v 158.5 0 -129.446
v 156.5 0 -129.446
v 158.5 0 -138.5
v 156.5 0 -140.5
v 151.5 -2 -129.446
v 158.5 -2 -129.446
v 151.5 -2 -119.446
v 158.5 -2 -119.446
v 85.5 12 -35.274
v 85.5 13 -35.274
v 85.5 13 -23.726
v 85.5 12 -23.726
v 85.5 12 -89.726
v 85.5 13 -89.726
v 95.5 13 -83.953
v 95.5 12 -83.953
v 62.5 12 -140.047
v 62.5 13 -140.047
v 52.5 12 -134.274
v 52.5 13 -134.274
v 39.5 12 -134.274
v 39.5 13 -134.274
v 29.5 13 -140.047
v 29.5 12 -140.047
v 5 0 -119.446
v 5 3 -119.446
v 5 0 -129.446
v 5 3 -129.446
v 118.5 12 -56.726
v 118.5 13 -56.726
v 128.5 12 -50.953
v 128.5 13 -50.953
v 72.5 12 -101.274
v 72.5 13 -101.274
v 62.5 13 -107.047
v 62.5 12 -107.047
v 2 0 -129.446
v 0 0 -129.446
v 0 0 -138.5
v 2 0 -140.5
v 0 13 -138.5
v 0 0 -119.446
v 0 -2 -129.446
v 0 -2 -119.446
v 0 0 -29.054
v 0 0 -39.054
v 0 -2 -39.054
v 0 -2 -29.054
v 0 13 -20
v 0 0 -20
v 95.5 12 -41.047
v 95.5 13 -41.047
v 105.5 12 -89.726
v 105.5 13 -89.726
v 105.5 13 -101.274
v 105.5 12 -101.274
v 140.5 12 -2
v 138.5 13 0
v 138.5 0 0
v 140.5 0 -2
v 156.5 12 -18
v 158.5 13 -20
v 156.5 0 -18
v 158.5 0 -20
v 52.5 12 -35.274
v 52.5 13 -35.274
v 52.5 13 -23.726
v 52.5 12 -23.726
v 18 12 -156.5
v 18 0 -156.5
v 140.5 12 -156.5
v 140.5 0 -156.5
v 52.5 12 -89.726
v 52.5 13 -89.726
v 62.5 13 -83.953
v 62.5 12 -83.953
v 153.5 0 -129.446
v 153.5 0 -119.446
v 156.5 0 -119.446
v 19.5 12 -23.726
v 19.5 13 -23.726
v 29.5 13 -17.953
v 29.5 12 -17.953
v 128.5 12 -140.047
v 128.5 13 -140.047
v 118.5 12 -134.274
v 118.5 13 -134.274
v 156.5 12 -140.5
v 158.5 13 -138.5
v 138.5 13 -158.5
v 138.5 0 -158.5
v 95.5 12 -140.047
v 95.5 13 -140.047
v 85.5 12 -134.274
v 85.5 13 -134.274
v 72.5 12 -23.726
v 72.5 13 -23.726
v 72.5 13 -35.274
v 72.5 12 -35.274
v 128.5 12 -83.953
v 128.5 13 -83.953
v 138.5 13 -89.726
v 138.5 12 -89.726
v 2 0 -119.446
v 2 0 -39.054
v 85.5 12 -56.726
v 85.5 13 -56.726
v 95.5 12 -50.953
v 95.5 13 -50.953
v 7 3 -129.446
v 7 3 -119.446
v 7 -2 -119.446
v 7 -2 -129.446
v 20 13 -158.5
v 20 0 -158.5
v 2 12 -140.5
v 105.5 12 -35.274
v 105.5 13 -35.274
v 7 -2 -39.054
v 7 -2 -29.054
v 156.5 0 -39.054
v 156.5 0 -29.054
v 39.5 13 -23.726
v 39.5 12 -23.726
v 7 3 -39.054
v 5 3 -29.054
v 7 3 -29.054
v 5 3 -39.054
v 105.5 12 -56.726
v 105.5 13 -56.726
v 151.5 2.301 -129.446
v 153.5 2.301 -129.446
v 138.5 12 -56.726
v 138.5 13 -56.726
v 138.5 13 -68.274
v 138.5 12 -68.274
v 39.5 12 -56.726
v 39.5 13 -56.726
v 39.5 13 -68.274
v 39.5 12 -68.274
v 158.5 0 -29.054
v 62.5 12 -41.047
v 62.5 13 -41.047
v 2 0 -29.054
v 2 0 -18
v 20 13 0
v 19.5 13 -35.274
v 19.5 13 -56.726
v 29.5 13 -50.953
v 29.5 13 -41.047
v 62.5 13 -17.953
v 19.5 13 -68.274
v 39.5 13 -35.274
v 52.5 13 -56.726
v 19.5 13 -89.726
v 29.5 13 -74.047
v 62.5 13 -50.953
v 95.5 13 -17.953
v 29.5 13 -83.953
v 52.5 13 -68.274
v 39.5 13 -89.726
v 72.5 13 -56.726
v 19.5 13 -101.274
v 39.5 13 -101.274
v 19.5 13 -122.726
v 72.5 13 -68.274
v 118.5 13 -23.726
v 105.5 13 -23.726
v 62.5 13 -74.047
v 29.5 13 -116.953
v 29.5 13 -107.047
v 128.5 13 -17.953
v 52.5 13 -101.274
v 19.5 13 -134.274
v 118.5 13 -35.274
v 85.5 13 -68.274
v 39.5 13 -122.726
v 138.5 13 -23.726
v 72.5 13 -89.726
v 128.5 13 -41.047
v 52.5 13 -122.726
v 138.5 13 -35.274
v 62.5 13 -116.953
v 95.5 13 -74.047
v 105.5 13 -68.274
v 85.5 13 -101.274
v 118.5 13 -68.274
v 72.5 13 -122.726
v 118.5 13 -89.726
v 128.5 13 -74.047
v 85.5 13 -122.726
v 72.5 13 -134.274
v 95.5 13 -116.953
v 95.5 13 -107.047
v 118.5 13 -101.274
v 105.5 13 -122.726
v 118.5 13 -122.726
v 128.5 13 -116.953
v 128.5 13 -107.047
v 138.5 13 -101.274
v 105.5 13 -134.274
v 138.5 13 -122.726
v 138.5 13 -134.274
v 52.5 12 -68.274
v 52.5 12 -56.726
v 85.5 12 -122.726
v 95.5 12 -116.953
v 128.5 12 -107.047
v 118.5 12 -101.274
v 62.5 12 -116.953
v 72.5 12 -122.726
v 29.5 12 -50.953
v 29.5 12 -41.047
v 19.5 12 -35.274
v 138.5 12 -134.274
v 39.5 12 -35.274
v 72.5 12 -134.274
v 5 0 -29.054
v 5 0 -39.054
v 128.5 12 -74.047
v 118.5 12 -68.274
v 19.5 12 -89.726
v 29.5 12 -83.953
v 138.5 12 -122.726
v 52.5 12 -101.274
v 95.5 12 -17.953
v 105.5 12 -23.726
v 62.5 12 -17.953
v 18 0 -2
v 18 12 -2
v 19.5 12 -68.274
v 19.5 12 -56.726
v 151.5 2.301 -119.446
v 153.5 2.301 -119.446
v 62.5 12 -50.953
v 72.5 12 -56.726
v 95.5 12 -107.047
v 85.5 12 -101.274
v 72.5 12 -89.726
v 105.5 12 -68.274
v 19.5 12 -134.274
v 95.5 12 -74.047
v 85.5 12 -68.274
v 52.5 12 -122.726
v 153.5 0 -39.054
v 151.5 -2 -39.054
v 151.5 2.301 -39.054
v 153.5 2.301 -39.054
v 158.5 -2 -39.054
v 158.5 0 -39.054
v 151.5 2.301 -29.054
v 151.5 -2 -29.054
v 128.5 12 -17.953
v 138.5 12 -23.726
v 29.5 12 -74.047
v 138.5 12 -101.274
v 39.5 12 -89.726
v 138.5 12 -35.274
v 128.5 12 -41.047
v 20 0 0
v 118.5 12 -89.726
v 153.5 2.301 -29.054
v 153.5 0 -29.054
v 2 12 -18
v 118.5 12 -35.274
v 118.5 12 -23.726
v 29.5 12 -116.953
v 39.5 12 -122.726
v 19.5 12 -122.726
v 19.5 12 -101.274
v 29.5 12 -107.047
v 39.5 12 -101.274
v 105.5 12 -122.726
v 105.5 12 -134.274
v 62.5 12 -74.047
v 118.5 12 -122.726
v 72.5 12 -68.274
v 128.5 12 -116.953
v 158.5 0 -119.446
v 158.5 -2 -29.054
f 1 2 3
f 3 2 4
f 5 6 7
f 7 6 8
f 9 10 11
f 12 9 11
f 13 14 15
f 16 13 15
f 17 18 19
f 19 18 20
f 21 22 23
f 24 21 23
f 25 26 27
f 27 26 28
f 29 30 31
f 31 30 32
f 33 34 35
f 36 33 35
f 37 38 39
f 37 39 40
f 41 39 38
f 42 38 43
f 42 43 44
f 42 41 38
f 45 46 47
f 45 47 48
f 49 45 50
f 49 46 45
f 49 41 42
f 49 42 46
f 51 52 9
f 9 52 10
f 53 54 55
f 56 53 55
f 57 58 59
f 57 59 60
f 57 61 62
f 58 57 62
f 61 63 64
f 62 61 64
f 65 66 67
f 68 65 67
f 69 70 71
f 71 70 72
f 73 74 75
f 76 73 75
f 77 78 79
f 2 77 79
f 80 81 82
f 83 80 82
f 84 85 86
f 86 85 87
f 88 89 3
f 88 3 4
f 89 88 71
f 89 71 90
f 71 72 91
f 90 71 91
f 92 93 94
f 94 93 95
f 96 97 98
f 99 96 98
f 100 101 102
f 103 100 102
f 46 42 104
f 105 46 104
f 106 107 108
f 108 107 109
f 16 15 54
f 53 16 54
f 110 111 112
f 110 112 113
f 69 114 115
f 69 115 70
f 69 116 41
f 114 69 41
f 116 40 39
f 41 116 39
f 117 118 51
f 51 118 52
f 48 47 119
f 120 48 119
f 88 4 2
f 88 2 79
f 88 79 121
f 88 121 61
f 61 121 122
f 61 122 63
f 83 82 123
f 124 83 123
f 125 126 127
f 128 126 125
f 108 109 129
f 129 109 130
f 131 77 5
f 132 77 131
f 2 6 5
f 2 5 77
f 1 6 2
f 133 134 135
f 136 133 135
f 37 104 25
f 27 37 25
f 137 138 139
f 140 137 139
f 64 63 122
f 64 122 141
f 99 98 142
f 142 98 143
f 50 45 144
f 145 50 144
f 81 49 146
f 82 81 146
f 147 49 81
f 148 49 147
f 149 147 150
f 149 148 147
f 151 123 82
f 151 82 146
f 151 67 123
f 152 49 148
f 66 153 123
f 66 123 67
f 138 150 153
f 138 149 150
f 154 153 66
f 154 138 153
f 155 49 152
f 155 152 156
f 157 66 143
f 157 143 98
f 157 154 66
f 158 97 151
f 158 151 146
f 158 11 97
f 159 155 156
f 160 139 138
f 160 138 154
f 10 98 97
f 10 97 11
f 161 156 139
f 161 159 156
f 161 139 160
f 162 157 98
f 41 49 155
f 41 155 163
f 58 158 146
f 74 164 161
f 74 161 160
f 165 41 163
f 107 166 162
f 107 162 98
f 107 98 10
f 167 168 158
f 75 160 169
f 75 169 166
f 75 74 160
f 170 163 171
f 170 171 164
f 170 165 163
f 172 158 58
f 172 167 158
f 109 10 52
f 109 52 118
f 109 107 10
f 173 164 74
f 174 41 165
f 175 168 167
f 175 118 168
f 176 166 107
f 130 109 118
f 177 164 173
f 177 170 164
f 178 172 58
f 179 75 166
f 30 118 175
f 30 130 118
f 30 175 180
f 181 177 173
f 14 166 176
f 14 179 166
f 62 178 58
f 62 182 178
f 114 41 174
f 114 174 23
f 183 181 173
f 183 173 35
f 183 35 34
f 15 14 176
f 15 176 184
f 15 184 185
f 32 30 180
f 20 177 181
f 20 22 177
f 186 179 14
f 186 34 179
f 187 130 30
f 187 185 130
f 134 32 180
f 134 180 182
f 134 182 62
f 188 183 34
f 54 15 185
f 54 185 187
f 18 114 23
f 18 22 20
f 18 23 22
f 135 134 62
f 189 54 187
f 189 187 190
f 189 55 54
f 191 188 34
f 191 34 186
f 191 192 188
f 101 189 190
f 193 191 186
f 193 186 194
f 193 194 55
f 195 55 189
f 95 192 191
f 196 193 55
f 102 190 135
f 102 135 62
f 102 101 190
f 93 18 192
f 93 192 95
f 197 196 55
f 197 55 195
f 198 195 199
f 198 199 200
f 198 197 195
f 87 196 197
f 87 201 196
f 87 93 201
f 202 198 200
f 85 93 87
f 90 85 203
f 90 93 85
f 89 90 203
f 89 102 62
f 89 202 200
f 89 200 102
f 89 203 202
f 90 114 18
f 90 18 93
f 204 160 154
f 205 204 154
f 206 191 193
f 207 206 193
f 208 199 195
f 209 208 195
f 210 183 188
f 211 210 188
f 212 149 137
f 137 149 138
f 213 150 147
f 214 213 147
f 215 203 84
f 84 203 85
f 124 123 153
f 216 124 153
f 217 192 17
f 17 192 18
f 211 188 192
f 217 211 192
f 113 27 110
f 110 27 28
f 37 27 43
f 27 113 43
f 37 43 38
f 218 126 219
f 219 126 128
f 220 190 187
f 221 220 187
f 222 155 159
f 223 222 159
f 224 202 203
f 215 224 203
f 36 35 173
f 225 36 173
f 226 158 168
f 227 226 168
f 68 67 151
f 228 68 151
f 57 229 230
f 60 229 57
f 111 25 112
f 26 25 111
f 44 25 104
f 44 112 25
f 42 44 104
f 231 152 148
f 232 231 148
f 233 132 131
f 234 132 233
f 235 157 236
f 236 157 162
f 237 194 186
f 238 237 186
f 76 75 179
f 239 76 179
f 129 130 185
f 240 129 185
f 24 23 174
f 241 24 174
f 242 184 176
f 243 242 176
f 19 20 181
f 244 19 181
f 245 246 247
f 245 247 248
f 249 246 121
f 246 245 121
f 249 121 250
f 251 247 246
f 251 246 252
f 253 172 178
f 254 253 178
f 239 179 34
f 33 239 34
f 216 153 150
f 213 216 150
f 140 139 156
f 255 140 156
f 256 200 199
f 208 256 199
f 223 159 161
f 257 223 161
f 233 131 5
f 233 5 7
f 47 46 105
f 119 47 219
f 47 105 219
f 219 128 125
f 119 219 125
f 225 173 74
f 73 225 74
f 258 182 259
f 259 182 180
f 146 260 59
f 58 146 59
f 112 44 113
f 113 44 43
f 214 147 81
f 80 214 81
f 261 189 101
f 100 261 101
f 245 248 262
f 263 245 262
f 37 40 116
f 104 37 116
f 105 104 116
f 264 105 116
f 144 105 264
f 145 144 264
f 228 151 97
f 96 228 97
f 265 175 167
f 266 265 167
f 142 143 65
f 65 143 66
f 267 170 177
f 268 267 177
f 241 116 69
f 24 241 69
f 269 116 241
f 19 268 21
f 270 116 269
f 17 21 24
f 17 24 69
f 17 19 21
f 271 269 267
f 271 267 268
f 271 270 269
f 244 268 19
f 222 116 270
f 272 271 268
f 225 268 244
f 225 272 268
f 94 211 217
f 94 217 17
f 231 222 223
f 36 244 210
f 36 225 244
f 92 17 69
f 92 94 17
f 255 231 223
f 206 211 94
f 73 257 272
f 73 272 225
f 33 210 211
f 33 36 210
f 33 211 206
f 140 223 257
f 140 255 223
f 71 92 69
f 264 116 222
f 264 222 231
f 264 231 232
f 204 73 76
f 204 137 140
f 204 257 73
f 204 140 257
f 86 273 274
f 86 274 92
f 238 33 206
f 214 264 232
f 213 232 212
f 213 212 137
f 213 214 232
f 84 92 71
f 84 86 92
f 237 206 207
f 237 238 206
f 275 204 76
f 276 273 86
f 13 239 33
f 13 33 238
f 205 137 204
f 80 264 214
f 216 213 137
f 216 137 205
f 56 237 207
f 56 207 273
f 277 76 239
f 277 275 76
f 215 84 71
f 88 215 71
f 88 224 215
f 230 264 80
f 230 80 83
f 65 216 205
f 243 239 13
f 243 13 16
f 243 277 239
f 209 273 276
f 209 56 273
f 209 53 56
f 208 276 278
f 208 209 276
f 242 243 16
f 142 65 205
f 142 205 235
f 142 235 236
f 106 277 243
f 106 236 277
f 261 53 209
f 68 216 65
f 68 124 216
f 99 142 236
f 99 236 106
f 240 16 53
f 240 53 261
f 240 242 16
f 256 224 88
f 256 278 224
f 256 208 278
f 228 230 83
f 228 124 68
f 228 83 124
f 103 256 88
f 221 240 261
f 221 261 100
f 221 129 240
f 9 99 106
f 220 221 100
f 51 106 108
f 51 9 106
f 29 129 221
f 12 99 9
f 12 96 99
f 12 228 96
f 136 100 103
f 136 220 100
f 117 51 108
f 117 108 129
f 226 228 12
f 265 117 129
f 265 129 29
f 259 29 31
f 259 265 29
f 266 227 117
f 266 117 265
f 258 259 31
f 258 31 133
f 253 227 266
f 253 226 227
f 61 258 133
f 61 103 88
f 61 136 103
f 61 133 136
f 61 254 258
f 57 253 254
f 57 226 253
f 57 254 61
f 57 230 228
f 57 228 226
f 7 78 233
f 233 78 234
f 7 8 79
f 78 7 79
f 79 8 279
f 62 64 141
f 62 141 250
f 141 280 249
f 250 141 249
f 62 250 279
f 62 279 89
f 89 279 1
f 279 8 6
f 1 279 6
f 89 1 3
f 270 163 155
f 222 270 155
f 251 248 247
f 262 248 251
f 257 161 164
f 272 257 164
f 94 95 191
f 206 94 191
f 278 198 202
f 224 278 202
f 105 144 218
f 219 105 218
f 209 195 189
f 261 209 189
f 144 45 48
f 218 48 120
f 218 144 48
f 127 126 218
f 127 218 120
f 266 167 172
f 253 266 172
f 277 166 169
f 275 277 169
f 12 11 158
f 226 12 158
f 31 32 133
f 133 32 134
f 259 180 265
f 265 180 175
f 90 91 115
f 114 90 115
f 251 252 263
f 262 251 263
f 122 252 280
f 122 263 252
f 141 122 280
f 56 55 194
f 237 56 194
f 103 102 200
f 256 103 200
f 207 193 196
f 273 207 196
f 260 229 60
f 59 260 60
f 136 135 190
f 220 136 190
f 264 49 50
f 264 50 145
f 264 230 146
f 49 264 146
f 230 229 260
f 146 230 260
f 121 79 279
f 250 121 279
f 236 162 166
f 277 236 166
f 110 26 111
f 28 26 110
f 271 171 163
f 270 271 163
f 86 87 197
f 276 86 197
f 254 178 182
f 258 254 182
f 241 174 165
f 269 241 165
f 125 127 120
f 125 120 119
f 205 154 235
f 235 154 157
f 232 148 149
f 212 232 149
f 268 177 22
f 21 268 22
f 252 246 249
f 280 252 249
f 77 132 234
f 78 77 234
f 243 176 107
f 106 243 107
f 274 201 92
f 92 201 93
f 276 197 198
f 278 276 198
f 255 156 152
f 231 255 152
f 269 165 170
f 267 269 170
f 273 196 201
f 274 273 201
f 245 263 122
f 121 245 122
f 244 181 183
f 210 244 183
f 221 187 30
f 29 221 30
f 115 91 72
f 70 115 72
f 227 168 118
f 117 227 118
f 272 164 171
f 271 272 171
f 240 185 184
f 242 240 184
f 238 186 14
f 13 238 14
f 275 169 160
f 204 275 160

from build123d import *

# Parameters (mm, degrees)
BOSS_EXTRUDE1_DEPTH = 13
SKETCH5_W           = 154.5
SKETCH5_H           = 154.5
CUT_EXTRUDE3_DEPTH  = 12
CUT_EXTRUDE4_DEPTH  = 11
SKETCH8_W           = 5
SKETCH8_H           = 10
BOSS_EXTRUDE2_DEPTH = 2
SKETCH9_W           = 10
SKETCH9_H           = 5
BOSS_EXTRUDE3_DEPTH = 2
SKETCH11_W          = 10
SKETCH11_H          = 4.300504792
BOSS_EXTRUDE4_DEPTH = 2


with BuildPart() as part:
    # Sketch1 → Boss-Extrude1 (new body)
    with BuildSketch(Plane(origin=(0, 0, 0), x_dir=(1, 0, 0), z_dir=(0, 1, 0))):
        Polygon((20, 158.5), (0, 138.5), (0, 20), (20, 0), (138.5, 0), (158.5, 20), (158.5, 138.5), (138.5, 158.5), align=None)
    extrude(amount=BOSS_EXTRUDE1_DEPTH)

    # Sketch5 → Cut-Extrude3 (cut)
    with BuildSketch(Plane.XZ):
        with Locations((79.25, -79.25)):
            Rectangle(SKETCH5_W, SKETCH5_H)
    extrude(amount=-CUT_EXTRUDE3_DEPTH, mode=Mode.SUBTRACT)

    # Sketch7 → Cut-Extrude4 (cut)
    with BuildSketch(Plane(origin=(0, 13, 0), x_dir=(1, 0, 0), z_dir=(0, 1, 0))):
        Polygon((138.5, 122.726497308), (138.5, 134.273502692), (128.5, 140.047005384), (118.5, 134.273502692), (118.5, 122.726497308), (128.5, 116.952994616), align=None)
        Polygon((105.5, 122.726497308), (105.5, 134.273502692), (95.5, 140.047005384), (85.5, 134.273502692), (85.5, 122.726497308), (95.5, 116.952994616), align=None)
        Polygon((72.5, 122.726497308), (72.5, 134.273502692), (62.5, 140.047005384), (52.5, 134.273502692), (52.5, 122.726497308), (62.5, 116.952994616), align=None)
        Polygon((39.5, 122.726497308), (39.5, 134.273502692), (29.5, 140.047005384), (19.5, 134.273502692), (19.5, 122.726497308), (29.5, 116.952994616), align=None)
        Polygon((105.5, 89.726497308), (105.5, 101.273502692), (95.5, 107.047005384), (85.5, 101.273502692), (85.5, 89.726497308), (95.5, 83.952994616), align=None)
        Polygon((72.5, 89.726497308), (72.5, 101.273502692), (62.5, 107.047005384), (52.5, 101.273502692), (52.5, 89.726497308), (62.5, 83.952994616), align=None)
        Polygon((39.5, 89.726497308), (39.5, 101.273502692), (29.5, 107.047005384), (19.5, 101.273502692), (19.5, 89.726497308), (29.5, 83.952994616), align=None)
        Polygon((105.5, 56.726497308), (105.5, 68.273502692), (95.5, 74.047005384), (85.5, 68.273502692), (85.5, 56.726497308), (95.5, 50.952994616), align=None)
        Polygon((72.5, 56.726497308), (72.5, 68.273502692), (62.5, 74.047005384), (52.5, 68.273502692), (52.5, 56.726497308), (62.5, 50.952994616), align=None)
        Polygon((39.5, 56.726497308), (39.5, 68.273502692), (29.5, 74.047005384), (19.5, 68.273502692), (19.5, 56.726497308), (29.5, 50.952994616), align=None)
        Polygon((105.5, 23.726497308), (105.5, 35.273502692), (95.5, 41.047005384), (85.5, 35.273502692), (85.5, 23.726497308), (95.5, 17.952994616), align=None)
        Polygon((72.5, 23.726497308), (72.5, 35.273502692), (62.5, 41.047005384), (52.5, 35.273502692), (52.5, 23.726497308), (62.5, 17.952994616), align=None)
        Polygon((39.5, 23.726497308), (39.5, 35.273502692), (29.5, 41.047005384), (19.5, 35.273502692), (19.5, 23.726497308), (29.5, 17.952994616), align=None)
        Polygon((138.5, 89.726497308), (138.5, 101.273502692), (128.5, 107.047005384), (118.5, 101.273502692), (118.5, 89.726497308), (128.5, 83.952994616), align=None)
        Polygon((138.5, 56.726497308), (138.5, 68.273502692), (128.5, 74.047005384), (118.5, 68.273502692), (118.5, 56.726497308), (128.5, 50.952994616), align=None)
        Polygon((138.5, 23.726497308), (138.5, 35.273502692), (128.5, 41.047005384), (118.5, 35.273502692), (118.5, 23.726497308), (128.5, 17.952994616), align=None)
    extrude(amount=-CUT_EXTRUDE4_DEPTH, mode=Mode.SUBTRACT)

    # Sketch8 → Boss-Extrude2 (add)
    with BuildSketch(Plane.XZ):
        with Locations((2.5, -34.05439508)):
            Rectangle(SKETCH8_W, SKETCH8_H)
        with Locations((2.5, -124.44560492)):
            Rectangle(SKETCH8_W, SKETCH8_H)
        with Locations((156, -124.44560492)):
            Rectangle(SKETCH8_W, SKETCH8_H)
        with Locations((156, -34.05439508)):
            Rectangle(SKETCH8_W, SKETCH8_H)
    extrude(amount=BOSS_EXTRUDE2_DEPTH)

    # Sketch9 → Boss-Extrude3 (add)
    with BuildSketch(Plane(origin=(5, 0, 0), x_dir=(0, 0, -1), z_dir=(1, 0, 0))):
        with Locations((124.44560492, 0.5)):
            Rectangle(SKETCH9_W, SKETCH9_H)
        with Locations((34.05439508, 0.5)):
            Rectangle(SKETCH9_W, SKETCH9_H)
    extrude(amount=BOSS_EXTRUDE3_DEPTH)

    # Sketch11 → Boss-Extrude4 (add)
    with BuildSketch(Plane.ZY.offset(-153.5)):
        with Locations((-124.44560492, 0.150252396)):
            Rectangle(SKETCH11_W, SKETCH11_H)
        with Locations((-34.05439508, 0.150252396)):
            Rectangle(SKETCH11_W, SKETCH11_H)
    extrude(amount=BOSS_EXTRUDE4_DEPTH)


solid = part.part
